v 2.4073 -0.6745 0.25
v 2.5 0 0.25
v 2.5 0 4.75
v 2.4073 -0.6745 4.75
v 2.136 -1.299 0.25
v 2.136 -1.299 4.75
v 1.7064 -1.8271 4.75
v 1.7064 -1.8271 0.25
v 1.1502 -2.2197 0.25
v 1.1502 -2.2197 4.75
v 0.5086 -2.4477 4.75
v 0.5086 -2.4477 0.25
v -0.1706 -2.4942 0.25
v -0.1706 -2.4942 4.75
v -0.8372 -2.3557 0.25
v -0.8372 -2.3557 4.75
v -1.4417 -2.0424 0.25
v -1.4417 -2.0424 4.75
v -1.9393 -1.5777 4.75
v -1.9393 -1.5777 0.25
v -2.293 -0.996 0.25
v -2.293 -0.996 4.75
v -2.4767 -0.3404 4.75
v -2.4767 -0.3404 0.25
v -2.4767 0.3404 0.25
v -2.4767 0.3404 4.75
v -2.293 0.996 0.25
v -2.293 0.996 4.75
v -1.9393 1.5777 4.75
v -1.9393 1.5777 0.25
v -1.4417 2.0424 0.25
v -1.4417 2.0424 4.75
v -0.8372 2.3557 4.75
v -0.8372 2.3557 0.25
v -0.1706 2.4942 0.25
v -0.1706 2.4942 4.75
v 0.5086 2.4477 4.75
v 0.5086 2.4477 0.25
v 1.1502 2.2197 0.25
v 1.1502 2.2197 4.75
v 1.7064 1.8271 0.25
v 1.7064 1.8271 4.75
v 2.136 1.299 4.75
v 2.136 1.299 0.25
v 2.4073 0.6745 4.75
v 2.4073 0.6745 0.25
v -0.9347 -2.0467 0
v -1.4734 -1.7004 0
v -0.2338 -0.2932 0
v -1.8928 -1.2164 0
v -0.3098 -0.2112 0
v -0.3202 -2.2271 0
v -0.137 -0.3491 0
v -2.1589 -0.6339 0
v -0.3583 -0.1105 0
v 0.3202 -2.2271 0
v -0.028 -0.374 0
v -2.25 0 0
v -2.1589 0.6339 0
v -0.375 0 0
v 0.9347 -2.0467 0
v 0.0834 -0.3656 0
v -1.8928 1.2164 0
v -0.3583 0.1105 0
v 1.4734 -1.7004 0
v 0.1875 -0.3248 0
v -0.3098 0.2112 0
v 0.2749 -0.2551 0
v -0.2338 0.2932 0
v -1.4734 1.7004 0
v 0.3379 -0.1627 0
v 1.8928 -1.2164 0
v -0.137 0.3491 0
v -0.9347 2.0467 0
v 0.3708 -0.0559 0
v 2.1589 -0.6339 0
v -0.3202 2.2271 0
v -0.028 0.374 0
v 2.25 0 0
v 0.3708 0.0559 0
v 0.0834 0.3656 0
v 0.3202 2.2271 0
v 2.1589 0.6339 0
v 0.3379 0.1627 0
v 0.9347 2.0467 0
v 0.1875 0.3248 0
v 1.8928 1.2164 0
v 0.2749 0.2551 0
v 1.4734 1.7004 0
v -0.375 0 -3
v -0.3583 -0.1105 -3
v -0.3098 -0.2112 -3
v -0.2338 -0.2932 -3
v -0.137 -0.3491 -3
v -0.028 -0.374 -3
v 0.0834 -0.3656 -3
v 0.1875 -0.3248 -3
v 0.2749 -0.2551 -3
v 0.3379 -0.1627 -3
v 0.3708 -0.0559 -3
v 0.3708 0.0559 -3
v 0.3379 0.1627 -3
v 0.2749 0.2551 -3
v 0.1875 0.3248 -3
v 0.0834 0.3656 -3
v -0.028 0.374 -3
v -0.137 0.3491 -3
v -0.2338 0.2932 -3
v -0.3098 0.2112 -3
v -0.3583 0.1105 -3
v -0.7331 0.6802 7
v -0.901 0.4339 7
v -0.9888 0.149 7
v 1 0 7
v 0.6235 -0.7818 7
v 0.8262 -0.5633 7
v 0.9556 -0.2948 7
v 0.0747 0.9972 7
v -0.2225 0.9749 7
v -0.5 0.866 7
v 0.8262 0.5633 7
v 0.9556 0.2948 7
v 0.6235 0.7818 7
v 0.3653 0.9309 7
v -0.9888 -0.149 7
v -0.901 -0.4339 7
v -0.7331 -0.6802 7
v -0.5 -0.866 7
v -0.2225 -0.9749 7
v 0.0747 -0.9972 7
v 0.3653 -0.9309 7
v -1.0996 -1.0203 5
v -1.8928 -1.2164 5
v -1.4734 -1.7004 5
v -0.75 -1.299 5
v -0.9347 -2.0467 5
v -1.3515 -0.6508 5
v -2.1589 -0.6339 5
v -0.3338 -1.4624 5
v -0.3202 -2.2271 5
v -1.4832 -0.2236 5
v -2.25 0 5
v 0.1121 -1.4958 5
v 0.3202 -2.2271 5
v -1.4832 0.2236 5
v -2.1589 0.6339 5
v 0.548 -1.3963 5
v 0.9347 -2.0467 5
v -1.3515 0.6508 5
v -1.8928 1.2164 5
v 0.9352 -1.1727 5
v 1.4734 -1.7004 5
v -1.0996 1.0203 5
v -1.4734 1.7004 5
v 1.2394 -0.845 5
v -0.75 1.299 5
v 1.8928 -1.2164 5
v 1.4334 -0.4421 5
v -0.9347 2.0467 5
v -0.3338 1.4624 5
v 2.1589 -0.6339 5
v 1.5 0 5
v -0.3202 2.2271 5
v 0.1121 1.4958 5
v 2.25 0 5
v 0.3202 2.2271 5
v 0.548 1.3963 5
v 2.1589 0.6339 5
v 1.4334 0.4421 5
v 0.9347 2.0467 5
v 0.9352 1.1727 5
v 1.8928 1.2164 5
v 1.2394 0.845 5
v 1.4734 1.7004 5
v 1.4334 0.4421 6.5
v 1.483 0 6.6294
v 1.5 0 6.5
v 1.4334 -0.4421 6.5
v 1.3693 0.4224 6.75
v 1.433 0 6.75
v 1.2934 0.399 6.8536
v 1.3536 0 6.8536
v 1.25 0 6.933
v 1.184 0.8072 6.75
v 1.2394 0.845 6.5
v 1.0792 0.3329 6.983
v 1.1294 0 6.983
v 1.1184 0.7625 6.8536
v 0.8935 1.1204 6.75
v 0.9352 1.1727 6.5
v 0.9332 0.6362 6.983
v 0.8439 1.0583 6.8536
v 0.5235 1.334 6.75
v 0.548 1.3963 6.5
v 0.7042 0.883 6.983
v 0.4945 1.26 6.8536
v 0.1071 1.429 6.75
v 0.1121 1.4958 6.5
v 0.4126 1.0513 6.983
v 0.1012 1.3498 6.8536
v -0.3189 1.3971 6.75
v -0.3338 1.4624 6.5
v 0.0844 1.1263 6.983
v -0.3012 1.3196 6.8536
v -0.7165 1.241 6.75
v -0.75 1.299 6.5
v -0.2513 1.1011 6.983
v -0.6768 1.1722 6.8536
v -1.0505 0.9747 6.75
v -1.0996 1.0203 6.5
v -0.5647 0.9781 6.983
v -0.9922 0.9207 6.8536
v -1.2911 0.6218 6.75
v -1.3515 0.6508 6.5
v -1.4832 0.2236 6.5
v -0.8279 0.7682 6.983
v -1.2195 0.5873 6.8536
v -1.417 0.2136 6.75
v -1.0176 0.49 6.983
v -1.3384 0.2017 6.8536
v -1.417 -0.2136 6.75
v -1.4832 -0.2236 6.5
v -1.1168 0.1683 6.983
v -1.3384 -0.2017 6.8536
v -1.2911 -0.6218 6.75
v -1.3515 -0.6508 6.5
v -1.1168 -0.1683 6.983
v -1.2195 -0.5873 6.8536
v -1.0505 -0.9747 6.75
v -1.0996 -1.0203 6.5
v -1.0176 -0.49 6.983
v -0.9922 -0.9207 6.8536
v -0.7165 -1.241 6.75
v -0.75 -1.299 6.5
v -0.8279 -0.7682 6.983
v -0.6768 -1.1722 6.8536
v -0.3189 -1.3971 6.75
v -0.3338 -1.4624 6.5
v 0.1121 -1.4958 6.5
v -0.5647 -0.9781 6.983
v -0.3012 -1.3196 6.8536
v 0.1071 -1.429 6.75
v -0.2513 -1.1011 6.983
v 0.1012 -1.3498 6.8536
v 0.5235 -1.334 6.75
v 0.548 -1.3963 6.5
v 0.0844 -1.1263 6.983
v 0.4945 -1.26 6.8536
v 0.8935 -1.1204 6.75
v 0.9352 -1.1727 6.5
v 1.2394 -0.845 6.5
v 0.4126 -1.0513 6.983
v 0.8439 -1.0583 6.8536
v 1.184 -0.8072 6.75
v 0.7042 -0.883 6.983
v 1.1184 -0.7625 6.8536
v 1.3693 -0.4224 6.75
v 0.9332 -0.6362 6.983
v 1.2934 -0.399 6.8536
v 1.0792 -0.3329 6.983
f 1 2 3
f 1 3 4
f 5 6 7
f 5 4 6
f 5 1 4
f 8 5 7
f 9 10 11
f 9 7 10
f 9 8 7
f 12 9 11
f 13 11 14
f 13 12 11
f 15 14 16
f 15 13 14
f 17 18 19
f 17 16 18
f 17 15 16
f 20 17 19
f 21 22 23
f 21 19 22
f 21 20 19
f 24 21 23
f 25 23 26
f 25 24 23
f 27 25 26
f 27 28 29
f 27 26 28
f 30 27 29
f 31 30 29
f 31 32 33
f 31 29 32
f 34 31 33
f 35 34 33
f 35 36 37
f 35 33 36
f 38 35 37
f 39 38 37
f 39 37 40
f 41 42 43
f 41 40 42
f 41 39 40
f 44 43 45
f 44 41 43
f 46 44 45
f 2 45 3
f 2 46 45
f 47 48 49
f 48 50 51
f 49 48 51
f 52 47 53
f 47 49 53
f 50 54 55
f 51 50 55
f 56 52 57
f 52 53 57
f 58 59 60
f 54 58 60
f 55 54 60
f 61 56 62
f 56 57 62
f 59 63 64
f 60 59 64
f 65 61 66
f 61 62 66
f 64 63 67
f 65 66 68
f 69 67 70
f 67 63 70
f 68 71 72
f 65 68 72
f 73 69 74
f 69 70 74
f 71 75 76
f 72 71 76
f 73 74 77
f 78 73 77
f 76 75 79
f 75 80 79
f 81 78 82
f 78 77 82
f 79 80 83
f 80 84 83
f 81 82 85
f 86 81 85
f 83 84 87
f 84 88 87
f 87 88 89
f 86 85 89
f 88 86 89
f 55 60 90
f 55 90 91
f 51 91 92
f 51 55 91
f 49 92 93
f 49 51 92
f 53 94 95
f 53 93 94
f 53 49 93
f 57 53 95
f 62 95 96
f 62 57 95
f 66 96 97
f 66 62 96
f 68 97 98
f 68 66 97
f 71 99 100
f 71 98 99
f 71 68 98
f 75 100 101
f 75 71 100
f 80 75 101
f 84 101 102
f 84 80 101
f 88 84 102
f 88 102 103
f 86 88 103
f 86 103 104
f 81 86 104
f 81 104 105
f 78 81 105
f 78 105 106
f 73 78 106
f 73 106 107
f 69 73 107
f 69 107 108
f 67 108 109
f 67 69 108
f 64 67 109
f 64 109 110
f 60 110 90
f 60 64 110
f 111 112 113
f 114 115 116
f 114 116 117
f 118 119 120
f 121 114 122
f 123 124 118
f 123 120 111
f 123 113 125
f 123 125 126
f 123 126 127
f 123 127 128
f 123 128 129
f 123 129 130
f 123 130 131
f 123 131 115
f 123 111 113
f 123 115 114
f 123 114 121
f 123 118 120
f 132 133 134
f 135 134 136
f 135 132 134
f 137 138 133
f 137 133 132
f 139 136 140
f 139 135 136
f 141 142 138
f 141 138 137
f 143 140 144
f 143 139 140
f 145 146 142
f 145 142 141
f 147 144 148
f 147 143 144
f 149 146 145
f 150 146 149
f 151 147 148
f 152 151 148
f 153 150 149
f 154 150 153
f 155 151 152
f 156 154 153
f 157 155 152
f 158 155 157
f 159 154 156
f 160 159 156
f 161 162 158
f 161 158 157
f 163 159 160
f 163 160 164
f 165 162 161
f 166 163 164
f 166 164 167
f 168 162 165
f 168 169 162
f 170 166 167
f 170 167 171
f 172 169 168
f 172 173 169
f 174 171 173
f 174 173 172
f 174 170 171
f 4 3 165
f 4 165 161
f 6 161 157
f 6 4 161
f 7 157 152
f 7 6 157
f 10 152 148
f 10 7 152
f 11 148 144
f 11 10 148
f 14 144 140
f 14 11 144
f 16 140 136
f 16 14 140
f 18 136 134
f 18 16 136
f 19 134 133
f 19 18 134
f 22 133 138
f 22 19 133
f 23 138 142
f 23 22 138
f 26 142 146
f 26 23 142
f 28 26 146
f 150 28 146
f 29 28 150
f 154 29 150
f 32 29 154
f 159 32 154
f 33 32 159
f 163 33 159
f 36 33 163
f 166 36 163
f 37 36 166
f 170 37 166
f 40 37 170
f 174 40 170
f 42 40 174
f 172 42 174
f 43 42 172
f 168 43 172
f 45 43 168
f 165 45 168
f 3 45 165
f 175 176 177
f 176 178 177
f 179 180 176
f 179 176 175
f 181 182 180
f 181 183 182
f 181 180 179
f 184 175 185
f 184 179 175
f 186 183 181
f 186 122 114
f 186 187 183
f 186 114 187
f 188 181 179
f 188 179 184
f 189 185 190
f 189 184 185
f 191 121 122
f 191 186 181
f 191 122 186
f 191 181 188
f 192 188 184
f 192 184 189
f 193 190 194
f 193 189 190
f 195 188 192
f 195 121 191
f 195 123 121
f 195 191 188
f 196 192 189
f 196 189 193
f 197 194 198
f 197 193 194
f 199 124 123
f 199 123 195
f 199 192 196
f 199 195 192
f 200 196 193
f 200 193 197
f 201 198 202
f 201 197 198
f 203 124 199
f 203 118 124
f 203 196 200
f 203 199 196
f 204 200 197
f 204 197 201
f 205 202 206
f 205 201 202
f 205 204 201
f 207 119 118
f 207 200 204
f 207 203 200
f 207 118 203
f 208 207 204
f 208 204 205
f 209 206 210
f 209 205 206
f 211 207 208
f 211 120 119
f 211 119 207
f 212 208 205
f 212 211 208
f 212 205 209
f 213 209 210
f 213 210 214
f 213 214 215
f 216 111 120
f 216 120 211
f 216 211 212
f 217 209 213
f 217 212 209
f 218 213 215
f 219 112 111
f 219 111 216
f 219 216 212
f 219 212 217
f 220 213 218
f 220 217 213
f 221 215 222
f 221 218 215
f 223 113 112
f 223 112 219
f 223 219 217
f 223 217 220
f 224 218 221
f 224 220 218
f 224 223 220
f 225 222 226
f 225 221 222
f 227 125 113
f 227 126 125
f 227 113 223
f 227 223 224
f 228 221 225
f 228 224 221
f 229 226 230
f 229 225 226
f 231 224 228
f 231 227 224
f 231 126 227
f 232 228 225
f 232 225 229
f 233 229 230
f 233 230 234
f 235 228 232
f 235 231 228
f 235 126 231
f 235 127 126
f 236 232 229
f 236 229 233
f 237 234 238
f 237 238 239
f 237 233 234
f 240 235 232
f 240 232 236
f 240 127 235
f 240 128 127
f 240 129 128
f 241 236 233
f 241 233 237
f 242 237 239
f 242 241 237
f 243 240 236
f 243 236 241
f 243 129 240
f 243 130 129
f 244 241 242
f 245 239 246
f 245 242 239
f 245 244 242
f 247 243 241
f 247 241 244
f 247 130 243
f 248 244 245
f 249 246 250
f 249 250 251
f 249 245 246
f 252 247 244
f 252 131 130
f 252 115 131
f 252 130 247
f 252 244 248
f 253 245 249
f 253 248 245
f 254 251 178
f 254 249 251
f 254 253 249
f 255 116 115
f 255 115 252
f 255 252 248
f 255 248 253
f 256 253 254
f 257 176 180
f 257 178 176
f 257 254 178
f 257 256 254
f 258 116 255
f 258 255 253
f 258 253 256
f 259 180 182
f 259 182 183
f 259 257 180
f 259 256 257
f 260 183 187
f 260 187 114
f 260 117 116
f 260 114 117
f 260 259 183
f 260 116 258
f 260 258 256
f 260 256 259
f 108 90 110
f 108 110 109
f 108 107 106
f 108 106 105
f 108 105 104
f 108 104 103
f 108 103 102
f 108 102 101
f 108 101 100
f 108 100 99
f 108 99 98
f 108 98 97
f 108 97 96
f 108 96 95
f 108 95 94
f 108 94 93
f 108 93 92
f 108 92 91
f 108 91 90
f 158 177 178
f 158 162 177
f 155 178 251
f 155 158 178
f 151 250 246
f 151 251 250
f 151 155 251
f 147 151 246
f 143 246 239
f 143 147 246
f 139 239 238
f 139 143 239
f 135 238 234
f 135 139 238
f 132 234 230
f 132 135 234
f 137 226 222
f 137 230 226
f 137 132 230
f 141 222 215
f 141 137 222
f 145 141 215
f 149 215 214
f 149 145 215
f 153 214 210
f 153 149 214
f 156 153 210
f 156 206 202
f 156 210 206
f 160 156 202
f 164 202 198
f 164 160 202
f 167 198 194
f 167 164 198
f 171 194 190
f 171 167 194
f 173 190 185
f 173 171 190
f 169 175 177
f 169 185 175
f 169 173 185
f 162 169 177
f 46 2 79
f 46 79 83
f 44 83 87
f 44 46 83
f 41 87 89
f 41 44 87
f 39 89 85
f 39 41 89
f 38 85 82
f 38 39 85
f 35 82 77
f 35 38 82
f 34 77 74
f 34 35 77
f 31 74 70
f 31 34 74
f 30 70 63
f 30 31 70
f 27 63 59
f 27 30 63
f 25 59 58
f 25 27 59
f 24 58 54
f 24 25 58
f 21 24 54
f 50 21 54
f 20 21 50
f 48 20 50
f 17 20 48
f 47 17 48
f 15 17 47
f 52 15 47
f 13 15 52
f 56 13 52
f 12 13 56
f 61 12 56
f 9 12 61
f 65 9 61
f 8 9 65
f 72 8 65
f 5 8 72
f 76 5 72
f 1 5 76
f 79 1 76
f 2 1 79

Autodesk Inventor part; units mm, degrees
ref_plane "YZ Plane" through (0, 0, 0) normal (1, 0, 0) x (0, 1, 0)
ref_plane "XZ Plane" through (0, 0, 0) normal (0, 1, 0) x (-1, 0, 0)
ref_plane "XY Plane" through (0, 0, 0) normal (0, 0, 1) x (1, 0, 0)
sketch "Sketch1" plane through (0, 0, 0) normal (0, 0, 1) x (1, 0, 0)
  circle A0 centre (0, 0) radius 2.5
  dimension "d0" = 5
extrude "Extrusion1" add sketch "Sketch1" along normal blind 5
chamfer "Chamfer1" distance 0.25 angle 45 2 edges at (-2.5, 0, 5) (-2.5, 0, 0)
sketch "Sketch2" plane through (0, 0, 5) normal (0, 0, 1) x (1, 0, 0)
  circle A0 centre (0, 0) radius 1.5
  dimension "d12" = 3
extrude "Extrusion2" add sketch "Sketch2" along normal blind 2
fillet "Fillet1" radius 0.5 1 edges at (-1.5, 0, 7)
sketch "Sketch3" plane through (0, 0, 0) normal (0, 0, -1) x (-1, 0, 0)
  circle A0 centre (0, 0) radius 0.375
  dimension "d9" = 0.75
extrude "Extrusion3" add sketch "Sketch3" along normal blind 3
properties part number "DC motor_CPY1"
